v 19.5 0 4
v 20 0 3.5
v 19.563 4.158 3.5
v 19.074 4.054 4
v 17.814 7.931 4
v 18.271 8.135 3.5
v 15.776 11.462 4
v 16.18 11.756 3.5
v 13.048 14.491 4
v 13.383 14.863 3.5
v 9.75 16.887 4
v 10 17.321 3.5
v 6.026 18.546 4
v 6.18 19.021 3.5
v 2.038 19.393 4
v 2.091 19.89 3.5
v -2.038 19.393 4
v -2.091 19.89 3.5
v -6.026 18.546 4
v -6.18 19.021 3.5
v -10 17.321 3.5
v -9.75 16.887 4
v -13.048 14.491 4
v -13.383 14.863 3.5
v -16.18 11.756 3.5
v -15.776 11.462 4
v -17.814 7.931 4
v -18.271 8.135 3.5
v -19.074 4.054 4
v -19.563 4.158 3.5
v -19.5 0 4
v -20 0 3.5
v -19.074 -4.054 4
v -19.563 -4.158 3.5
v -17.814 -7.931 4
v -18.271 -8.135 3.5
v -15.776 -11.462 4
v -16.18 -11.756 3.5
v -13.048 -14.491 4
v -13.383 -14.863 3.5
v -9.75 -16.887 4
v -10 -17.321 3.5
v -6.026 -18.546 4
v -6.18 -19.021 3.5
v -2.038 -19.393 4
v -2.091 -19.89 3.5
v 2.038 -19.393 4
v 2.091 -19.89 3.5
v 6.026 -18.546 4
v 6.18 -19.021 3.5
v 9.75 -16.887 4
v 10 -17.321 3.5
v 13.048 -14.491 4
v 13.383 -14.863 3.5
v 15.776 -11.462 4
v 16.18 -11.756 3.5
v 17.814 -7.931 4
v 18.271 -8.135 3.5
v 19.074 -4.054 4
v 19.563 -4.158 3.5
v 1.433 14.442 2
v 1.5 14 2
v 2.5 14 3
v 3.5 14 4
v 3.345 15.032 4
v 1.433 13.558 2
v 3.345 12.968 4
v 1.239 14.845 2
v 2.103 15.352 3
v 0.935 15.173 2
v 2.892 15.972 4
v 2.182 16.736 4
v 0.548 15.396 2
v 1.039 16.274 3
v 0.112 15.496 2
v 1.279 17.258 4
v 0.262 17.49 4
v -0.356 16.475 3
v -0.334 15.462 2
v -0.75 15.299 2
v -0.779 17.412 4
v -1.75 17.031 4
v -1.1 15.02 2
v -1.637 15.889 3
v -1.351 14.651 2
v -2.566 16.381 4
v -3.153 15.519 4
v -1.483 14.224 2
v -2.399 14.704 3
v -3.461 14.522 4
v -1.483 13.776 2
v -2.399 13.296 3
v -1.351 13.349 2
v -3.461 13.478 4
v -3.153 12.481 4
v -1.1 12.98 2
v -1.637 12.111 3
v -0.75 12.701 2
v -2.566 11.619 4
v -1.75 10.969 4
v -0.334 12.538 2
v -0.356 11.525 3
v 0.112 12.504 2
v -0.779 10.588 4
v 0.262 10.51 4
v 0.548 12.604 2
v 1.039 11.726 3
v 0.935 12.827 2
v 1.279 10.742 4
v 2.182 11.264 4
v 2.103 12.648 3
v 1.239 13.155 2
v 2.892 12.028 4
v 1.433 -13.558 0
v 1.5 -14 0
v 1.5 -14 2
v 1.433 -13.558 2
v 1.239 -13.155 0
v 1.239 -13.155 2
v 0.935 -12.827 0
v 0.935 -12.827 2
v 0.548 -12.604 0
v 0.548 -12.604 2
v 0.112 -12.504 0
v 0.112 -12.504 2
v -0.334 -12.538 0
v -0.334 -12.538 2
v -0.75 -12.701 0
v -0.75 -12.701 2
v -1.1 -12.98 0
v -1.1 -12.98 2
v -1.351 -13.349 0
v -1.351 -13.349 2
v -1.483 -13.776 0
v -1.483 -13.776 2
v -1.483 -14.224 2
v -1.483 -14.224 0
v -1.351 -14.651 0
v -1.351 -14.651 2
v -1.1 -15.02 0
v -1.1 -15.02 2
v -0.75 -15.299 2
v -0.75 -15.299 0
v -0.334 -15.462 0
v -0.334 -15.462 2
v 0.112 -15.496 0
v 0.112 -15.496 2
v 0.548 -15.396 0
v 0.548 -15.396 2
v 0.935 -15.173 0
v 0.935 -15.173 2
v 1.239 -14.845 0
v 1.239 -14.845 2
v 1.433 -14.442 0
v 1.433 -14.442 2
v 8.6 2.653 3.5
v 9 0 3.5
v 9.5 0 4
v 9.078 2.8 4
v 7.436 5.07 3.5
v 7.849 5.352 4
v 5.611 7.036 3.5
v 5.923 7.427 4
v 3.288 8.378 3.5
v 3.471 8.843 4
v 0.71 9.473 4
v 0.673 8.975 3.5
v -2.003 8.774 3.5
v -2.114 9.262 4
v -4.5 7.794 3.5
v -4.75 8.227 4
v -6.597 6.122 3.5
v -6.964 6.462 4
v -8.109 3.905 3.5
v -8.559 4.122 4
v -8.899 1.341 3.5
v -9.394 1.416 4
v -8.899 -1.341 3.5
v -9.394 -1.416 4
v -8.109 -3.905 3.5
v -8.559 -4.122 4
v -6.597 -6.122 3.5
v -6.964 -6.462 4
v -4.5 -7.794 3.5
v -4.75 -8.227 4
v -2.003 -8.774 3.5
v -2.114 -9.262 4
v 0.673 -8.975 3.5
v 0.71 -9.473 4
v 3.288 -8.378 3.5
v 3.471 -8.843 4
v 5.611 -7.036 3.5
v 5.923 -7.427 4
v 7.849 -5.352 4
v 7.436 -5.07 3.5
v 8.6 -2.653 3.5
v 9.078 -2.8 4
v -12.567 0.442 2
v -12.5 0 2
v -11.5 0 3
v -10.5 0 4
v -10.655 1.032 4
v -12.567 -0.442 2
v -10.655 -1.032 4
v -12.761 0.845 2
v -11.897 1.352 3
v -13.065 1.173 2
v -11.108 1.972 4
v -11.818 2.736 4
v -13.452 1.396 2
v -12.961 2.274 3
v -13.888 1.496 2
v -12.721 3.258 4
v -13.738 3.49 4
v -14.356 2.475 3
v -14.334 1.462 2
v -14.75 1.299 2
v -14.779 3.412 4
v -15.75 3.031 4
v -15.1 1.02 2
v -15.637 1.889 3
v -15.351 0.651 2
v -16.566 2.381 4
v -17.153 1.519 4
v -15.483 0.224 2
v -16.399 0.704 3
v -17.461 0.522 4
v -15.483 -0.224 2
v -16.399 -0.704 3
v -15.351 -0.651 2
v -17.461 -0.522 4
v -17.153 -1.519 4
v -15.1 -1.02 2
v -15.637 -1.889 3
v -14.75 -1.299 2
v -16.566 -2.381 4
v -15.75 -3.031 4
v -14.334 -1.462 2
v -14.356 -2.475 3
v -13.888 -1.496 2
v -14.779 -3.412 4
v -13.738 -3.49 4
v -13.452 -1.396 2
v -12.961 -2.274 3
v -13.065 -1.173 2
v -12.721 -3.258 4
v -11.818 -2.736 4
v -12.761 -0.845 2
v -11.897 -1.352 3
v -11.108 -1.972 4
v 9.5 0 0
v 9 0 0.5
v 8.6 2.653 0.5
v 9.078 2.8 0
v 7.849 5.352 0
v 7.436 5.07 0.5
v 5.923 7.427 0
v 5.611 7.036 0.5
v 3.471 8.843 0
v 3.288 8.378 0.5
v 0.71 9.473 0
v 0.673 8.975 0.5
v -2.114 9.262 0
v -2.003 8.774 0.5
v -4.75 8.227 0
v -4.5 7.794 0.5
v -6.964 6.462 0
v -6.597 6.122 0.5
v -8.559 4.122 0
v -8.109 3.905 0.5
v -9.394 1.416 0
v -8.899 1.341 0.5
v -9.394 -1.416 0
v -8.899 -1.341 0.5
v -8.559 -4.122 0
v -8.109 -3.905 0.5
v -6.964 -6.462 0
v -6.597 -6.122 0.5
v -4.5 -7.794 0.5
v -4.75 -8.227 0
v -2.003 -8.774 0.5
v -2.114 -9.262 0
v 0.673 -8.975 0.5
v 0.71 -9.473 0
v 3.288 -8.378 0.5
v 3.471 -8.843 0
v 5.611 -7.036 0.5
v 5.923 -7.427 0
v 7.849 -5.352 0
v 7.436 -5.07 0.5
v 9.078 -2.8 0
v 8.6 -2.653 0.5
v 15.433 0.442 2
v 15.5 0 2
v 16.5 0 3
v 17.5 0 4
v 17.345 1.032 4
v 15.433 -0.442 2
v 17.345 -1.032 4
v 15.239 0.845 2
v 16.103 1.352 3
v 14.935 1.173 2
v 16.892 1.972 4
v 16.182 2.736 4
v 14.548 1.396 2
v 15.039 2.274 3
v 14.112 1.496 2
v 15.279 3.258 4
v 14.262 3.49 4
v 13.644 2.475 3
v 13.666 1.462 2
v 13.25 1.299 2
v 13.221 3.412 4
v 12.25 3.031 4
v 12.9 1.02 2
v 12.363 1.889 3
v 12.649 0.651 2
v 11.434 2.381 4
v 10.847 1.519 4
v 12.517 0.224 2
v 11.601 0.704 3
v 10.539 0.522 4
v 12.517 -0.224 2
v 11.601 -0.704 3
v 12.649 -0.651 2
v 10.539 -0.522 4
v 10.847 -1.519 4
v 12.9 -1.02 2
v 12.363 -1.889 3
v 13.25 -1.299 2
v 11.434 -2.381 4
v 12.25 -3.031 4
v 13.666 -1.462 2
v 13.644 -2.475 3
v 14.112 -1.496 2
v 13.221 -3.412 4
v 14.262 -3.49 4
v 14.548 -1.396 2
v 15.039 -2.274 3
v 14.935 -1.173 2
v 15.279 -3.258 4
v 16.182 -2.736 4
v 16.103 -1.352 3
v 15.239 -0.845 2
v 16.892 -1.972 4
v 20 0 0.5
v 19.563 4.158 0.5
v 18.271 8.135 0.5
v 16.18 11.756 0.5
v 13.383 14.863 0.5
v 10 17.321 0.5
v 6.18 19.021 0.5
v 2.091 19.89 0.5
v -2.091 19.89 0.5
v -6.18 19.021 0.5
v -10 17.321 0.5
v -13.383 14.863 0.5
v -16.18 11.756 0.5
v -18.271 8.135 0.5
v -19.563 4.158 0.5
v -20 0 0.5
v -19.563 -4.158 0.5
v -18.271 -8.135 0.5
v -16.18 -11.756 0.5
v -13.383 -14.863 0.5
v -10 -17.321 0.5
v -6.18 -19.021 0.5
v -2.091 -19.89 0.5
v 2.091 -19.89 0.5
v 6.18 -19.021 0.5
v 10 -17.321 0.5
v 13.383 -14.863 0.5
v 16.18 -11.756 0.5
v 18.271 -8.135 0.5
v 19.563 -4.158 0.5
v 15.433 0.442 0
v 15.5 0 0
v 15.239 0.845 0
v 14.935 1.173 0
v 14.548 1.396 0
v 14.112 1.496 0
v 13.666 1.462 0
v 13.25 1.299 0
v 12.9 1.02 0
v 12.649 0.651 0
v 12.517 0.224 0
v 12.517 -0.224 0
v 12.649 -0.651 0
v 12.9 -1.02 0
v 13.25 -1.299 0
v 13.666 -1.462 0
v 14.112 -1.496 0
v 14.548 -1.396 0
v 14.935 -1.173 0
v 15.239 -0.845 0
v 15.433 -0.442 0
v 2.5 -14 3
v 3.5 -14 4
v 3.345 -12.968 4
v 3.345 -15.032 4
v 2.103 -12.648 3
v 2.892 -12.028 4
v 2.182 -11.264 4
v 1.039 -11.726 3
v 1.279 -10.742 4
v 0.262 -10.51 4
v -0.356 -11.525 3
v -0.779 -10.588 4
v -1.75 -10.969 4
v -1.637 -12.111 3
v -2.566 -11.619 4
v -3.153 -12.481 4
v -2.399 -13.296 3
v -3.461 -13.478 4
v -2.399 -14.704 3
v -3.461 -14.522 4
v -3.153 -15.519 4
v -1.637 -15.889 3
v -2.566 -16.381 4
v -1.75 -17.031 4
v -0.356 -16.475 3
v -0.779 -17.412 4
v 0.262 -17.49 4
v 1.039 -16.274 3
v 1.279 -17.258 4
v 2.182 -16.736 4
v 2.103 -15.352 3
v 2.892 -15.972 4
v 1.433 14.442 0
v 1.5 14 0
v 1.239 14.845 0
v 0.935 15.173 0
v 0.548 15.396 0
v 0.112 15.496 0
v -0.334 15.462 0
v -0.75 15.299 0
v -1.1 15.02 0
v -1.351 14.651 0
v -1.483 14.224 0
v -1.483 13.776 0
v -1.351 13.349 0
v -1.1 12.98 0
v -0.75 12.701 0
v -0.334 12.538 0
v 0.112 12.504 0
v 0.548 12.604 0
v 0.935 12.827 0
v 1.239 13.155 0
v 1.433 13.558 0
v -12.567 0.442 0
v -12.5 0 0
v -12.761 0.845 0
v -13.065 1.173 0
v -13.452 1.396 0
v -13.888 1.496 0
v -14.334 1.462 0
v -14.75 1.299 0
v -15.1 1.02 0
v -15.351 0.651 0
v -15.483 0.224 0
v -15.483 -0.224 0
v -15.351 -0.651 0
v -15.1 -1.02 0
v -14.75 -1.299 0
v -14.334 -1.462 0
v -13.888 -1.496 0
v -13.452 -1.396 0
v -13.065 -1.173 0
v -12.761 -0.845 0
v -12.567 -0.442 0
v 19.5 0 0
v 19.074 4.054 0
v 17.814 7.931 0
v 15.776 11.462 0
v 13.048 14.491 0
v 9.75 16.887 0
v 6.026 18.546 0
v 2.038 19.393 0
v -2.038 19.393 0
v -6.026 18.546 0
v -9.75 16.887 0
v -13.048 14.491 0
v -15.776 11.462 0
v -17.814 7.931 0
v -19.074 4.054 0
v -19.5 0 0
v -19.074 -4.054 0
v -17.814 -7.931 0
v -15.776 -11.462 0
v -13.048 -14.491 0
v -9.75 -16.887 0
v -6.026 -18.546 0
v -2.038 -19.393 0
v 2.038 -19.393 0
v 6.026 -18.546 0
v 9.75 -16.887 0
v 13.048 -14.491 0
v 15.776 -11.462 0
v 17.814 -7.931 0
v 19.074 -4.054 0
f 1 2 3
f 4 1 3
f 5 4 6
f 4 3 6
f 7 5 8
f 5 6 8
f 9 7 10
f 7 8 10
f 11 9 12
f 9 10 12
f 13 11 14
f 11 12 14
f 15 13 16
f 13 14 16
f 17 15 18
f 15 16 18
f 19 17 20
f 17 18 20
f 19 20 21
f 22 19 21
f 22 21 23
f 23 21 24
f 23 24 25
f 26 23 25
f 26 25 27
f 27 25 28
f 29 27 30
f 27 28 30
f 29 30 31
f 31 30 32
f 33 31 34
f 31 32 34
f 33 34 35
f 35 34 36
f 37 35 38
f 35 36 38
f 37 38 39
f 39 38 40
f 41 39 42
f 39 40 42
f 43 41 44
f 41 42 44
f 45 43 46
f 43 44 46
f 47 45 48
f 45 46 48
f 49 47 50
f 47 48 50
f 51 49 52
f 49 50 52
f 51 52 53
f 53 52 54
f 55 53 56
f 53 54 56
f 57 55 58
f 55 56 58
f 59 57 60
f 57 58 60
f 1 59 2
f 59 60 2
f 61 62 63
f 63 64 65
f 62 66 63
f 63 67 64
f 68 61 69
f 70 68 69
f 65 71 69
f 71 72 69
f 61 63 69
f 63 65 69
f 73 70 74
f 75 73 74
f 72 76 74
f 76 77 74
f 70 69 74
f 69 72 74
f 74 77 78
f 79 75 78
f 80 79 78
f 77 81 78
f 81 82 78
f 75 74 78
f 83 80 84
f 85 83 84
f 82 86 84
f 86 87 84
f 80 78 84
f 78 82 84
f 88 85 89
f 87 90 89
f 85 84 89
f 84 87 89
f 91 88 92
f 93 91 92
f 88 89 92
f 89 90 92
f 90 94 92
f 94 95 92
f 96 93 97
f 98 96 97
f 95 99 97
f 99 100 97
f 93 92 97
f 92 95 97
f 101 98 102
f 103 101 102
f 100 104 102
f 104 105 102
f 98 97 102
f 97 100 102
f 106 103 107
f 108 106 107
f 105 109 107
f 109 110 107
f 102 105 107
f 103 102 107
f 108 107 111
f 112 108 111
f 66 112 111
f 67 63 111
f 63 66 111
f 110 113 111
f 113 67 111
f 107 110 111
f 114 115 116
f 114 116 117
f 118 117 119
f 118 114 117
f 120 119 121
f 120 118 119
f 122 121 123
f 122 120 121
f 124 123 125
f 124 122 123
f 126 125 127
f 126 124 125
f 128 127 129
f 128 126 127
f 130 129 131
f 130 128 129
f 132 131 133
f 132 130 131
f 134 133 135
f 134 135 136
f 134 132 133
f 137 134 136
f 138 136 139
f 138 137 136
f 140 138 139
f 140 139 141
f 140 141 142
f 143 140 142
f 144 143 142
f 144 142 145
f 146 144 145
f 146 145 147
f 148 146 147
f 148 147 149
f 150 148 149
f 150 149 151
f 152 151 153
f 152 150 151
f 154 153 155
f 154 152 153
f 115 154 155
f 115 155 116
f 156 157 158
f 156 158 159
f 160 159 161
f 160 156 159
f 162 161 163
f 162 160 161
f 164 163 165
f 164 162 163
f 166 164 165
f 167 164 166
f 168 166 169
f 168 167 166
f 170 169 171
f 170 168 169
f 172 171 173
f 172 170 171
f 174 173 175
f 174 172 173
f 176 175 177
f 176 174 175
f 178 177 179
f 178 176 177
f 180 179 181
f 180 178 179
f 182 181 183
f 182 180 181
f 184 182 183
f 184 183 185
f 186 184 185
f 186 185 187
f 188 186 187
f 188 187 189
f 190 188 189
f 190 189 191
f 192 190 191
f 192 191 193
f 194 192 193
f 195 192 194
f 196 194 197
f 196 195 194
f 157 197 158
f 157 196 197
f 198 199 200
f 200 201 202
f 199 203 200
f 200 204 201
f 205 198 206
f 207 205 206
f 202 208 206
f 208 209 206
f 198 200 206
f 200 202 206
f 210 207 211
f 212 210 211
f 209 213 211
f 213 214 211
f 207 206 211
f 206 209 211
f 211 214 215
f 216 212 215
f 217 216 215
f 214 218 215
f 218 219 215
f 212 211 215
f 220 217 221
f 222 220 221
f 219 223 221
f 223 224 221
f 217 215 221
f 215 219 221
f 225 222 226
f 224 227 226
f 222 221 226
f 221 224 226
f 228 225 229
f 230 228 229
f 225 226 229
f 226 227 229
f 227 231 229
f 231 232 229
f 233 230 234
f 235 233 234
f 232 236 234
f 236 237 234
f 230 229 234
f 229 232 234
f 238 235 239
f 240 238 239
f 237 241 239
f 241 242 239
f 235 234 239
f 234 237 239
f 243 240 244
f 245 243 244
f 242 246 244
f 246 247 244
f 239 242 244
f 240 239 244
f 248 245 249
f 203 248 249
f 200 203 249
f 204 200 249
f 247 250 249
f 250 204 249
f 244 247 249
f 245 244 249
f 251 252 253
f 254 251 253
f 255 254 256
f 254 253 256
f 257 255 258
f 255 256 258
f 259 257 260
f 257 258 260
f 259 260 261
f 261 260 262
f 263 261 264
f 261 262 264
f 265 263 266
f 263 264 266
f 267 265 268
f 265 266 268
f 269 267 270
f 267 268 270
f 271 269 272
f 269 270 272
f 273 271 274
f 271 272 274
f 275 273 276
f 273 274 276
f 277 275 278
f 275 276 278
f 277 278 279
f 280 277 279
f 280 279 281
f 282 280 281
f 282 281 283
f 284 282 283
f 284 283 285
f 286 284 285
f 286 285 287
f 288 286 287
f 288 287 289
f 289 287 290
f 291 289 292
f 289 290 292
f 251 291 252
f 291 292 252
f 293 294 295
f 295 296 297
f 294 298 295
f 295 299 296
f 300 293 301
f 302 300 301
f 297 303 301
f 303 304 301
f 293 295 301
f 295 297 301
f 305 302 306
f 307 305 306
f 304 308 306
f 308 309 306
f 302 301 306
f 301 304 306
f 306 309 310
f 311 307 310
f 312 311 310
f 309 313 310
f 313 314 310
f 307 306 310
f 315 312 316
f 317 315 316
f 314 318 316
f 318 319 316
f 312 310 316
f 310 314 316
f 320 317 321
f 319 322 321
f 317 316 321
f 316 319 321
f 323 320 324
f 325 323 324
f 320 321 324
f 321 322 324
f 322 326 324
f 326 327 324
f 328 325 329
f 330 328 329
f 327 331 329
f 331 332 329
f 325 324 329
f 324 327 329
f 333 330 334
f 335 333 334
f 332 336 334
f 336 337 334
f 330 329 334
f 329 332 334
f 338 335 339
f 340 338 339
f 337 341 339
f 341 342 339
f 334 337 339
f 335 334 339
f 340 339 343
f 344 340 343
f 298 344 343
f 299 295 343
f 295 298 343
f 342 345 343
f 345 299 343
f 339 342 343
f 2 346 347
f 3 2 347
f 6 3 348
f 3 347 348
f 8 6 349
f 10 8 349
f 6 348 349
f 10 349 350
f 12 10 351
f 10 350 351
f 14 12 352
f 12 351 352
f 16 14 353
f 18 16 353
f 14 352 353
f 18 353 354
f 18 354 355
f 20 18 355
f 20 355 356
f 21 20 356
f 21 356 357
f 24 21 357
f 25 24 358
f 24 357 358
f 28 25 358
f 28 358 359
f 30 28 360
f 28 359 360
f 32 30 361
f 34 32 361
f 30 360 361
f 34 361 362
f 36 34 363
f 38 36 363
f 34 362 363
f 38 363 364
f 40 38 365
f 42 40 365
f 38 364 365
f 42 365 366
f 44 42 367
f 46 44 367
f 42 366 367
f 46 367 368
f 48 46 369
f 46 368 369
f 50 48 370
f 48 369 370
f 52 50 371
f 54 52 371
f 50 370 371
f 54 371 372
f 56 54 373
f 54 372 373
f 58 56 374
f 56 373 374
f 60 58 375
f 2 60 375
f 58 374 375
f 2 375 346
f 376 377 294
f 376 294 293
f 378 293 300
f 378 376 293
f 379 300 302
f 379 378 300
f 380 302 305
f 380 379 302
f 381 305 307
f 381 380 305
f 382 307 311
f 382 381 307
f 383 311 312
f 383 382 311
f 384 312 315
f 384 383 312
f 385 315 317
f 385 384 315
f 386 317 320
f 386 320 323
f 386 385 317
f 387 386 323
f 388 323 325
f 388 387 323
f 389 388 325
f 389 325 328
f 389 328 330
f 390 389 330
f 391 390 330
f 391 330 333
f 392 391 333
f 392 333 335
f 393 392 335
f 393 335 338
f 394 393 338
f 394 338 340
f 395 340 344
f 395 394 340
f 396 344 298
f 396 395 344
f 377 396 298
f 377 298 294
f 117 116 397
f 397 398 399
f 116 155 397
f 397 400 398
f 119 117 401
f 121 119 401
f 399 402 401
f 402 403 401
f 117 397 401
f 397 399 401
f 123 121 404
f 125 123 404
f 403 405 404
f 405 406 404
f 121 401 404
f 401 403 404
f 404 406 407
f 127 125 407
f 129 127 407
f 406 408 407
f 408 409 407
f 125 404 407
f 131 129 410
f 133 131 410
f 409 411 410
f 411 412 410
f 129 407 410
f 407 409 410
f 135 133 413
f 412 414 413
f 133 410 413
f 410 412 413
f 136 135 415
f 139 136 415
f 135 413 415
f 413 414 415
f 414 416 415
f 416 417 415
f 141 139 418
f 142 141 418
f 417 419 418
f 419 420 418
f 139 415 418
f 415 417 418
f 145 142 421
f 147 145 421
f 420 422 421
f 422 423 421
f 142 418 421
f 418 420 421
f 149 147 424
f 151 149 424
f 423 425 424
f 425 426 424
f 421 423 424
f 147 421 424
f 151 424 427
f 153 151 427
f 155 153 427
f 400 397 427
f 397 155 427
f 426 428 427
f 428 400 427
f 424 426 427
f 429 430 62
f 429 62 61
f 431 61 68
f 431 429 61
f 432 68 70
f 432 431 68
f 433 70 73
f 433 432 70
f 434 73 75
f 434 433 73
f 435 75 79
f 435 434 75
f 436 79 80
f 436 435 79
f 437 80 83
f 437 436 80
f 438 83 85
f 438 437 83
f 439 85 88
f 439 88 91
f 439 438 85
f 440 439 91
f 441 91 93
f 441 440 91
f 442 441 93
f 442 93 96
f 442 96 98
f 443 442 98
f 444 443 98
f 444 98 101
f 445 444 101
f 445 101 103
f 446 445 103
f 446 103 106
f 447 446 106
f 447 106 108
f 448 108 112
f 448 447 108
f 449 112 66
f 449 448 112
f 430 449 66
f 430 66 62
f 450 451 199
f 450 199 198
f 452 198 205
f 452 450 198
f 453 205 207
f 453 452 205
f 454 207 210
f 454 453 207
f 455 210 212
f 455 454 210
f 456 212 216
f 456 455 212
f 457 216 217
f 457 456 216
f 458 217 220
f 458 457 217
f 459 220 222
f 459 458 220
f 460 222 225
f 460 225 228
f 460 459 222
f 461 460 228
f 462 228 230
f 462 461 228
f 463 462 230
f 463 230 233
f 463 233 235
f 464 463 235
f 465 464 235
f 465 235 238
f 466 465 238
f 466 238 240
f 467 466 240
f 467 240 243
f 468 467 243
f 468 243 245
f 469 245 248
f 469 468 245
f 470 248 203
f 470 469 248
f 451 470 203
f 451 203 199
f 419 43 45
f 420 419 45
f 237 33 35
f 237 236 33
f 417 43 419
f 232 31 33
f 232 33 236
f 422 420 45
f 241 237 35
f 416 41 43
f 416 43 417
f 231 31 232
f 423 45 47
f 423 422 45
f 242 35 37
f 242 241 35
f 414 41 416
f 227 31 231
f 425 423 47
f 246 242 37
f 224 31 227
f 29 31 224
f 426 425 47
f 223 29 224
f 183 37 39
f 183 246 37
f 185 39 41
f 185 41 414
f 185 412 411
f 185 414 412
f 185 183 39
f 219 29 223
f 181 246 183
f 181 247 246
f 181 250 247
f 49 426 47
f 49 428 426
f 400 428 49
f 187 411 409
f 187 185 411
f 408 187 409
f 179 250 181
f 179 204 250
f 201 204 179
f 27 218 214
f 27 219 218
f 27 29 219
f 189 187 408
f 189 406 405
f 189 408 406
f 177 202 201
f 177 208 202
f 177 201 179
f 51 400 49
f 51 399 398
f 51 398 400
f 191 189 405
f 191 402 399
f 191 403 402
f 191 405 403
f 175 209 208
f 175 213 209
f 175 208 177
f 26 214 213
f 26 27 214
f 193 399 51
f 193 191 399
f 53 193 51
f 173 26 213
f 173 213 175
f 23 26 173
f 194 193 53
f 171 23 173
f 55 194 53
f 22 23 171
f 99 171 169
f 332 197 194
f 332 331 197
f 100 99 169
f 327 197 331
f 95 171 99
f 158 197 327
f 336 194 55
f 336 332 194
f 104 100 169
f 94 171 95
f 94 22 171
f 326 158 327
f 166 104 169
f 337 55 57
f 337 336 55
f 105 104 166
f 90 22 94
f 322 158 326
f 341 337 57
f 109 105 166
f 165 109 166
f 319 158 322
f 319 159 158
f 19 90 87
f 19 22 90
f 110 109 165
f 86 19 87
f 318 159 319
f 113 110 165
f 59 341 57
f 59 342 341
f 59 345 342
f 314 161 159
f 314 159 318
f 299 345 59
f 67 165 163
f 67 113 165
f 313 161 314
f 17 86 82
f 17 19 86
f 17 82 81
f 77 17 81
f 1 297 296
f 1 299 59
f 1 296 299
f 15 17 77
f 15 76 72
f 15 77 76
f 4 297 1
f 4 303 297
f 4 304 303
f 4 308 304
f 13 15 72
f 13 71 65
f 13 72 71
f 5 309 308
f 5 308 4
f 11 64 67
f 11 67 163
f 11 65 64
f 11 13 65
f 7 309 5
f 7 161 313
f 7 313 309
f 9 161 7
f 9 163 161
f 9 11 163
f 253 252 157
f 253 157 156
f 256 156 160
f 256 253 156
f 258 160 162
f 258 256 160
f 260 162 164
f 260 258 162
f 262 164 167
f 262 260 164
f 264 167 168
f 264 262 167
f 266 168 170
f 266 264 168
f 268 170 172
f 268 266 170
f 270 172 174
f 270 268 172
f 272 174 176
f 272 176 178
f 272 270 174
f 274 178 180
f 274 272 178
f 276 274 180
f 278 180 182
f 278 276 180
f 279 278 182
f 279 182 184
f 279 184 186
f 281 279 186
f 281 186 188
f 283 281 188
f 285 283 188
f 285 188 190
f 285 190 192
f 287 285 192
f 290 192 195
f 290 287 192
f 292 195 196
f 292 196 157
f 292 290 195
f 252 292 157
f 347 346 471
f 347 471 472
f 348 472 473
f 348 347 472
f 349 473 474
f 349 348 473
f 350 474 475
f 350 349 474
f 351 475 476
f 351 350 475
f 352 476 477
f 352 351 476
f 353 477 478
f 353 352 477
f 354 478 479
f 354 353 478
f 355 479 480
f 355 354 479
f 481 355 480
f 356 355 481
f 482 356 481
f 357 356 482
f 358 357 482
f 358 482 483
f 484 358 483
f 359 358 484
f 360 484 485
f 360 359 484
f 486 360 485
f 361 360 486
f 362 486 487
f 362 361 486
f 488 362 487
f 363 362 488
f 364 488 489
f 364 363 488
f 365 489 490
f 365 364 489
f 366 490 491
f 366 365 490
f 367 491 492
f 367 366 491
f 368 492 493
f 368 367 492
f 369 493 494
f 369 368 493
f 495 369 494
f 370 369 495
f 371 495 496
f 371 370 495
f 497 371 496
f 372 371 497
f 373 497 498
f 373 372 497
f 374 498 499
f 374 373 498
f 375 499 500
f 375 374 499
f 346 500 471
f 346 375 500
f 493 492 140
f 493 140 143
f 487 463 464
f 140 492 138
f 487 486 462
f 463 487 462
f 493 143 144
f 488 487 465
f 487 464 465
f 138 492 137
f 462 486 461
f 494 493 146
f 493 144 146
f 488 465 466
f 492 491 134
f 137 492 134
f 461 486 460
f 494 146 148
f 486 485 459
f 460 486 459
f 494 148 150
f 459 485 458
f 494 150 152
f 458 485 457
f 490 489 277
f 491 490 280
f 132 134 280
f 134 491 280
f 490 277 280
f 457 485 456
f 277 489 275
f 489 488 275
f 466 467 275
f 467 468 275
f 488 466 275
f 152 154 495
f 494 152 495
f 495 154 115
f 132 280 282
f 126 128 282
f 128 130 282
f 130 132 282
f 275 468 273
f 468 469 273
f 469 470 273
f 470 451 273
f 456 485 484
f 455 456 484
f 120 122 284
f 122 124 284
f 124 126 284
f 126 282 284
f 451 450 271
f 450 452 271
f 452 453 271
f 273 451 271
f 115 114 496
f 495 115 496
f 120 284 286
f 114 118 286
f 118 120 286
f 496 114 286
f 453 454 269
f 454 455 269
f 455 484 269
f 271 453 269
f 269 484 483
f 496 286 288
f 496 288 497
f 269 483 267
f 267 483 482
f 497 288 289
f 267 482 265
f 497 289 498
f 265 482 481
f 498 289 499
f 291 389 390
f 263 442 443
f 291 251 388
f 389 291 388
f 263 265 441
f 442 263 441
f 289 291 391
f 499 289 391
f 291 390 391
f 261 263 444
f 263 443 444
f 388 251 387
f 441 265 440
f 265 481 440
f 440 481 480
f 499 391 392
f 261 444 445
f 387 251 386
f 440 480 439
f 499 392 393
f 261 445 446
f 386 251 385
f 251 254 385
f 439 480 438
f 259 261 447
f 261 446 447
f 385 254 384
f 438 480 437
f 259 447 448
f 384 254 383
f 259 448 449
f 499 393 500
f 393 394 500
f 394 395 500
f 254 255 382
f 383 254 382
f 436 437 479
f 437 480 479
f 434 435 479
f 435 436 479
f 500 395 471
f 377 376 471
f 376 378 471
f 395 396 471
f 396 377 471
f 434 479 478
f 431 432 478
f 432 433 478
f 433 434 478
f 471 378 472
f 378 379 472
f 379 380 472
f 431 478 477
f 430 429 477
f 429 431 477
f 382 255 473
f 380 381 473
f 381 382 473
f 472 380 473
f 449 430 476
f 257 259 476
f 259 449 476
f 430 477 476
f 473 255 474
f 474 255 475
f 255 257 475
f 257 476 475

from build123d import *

# Parameters (mm, degrees)
ESQUISSE1_R      = 20
ESQUISSE1_R_2    = 9
ESQUISSE1_R_3    = 1.5
EXTRUSION1_DEPTH = 4
CHANFREIN1_SIZE  = 2
CHANFREIN2_SIZE  = 0.5


with BuildPart() as part:
    # Esquisse1 → Extrusion1 (new body)
    with BuildSketch(Plane.XY):
        Circle(ESQUISSE1_R)
        Circle(ESQUISSE1_R_2, mode=Mode.SUBTRACT)
        with Locations((0, 14)):
            Circle(ESQUISSE1_R_3, mode=Mode.SUBTRACT)
        with Locations((-14, 0)):
            Circle(ESQUISSE1_R_3, mode=Mode.SUBTRACT)
        with Locations((14, 0)):
            Circle(ESQUISSE1_R_3, mode=Mode.SUBTRACT)
        with Locations((0, -14)):
            Circle(ESQUISSE1_R_3, mode=Mode.SUBTRACT)
    extrude(amount=EXTRUSION1_DEPTH)

    # Chanfrein1
    chanfrein1_edges = [part.edges().sort_by_distance(p)[0] for p in [
        (-15.5, 0, 4),
        (12.5, 0, 4),
        (-1.5, -14, 4),
        (-1.5, 14, 4),
    ]]
    chamfer(chanfrein1_edges, length=CHANFREIN1_SIZE)

    # Chanfrein2
    chanfrein2_edges = [part.edges().sort_by_distance(p)[0] for p in [
        (-20, 0, 0),
        (-20, 0, 4),
        (-9, 0, 0),
        (-9, 0, 4),
    ]]
    chamfer(chanfrein2_edges, length=CHANFREIN2_SIZE)


solid = part.part
